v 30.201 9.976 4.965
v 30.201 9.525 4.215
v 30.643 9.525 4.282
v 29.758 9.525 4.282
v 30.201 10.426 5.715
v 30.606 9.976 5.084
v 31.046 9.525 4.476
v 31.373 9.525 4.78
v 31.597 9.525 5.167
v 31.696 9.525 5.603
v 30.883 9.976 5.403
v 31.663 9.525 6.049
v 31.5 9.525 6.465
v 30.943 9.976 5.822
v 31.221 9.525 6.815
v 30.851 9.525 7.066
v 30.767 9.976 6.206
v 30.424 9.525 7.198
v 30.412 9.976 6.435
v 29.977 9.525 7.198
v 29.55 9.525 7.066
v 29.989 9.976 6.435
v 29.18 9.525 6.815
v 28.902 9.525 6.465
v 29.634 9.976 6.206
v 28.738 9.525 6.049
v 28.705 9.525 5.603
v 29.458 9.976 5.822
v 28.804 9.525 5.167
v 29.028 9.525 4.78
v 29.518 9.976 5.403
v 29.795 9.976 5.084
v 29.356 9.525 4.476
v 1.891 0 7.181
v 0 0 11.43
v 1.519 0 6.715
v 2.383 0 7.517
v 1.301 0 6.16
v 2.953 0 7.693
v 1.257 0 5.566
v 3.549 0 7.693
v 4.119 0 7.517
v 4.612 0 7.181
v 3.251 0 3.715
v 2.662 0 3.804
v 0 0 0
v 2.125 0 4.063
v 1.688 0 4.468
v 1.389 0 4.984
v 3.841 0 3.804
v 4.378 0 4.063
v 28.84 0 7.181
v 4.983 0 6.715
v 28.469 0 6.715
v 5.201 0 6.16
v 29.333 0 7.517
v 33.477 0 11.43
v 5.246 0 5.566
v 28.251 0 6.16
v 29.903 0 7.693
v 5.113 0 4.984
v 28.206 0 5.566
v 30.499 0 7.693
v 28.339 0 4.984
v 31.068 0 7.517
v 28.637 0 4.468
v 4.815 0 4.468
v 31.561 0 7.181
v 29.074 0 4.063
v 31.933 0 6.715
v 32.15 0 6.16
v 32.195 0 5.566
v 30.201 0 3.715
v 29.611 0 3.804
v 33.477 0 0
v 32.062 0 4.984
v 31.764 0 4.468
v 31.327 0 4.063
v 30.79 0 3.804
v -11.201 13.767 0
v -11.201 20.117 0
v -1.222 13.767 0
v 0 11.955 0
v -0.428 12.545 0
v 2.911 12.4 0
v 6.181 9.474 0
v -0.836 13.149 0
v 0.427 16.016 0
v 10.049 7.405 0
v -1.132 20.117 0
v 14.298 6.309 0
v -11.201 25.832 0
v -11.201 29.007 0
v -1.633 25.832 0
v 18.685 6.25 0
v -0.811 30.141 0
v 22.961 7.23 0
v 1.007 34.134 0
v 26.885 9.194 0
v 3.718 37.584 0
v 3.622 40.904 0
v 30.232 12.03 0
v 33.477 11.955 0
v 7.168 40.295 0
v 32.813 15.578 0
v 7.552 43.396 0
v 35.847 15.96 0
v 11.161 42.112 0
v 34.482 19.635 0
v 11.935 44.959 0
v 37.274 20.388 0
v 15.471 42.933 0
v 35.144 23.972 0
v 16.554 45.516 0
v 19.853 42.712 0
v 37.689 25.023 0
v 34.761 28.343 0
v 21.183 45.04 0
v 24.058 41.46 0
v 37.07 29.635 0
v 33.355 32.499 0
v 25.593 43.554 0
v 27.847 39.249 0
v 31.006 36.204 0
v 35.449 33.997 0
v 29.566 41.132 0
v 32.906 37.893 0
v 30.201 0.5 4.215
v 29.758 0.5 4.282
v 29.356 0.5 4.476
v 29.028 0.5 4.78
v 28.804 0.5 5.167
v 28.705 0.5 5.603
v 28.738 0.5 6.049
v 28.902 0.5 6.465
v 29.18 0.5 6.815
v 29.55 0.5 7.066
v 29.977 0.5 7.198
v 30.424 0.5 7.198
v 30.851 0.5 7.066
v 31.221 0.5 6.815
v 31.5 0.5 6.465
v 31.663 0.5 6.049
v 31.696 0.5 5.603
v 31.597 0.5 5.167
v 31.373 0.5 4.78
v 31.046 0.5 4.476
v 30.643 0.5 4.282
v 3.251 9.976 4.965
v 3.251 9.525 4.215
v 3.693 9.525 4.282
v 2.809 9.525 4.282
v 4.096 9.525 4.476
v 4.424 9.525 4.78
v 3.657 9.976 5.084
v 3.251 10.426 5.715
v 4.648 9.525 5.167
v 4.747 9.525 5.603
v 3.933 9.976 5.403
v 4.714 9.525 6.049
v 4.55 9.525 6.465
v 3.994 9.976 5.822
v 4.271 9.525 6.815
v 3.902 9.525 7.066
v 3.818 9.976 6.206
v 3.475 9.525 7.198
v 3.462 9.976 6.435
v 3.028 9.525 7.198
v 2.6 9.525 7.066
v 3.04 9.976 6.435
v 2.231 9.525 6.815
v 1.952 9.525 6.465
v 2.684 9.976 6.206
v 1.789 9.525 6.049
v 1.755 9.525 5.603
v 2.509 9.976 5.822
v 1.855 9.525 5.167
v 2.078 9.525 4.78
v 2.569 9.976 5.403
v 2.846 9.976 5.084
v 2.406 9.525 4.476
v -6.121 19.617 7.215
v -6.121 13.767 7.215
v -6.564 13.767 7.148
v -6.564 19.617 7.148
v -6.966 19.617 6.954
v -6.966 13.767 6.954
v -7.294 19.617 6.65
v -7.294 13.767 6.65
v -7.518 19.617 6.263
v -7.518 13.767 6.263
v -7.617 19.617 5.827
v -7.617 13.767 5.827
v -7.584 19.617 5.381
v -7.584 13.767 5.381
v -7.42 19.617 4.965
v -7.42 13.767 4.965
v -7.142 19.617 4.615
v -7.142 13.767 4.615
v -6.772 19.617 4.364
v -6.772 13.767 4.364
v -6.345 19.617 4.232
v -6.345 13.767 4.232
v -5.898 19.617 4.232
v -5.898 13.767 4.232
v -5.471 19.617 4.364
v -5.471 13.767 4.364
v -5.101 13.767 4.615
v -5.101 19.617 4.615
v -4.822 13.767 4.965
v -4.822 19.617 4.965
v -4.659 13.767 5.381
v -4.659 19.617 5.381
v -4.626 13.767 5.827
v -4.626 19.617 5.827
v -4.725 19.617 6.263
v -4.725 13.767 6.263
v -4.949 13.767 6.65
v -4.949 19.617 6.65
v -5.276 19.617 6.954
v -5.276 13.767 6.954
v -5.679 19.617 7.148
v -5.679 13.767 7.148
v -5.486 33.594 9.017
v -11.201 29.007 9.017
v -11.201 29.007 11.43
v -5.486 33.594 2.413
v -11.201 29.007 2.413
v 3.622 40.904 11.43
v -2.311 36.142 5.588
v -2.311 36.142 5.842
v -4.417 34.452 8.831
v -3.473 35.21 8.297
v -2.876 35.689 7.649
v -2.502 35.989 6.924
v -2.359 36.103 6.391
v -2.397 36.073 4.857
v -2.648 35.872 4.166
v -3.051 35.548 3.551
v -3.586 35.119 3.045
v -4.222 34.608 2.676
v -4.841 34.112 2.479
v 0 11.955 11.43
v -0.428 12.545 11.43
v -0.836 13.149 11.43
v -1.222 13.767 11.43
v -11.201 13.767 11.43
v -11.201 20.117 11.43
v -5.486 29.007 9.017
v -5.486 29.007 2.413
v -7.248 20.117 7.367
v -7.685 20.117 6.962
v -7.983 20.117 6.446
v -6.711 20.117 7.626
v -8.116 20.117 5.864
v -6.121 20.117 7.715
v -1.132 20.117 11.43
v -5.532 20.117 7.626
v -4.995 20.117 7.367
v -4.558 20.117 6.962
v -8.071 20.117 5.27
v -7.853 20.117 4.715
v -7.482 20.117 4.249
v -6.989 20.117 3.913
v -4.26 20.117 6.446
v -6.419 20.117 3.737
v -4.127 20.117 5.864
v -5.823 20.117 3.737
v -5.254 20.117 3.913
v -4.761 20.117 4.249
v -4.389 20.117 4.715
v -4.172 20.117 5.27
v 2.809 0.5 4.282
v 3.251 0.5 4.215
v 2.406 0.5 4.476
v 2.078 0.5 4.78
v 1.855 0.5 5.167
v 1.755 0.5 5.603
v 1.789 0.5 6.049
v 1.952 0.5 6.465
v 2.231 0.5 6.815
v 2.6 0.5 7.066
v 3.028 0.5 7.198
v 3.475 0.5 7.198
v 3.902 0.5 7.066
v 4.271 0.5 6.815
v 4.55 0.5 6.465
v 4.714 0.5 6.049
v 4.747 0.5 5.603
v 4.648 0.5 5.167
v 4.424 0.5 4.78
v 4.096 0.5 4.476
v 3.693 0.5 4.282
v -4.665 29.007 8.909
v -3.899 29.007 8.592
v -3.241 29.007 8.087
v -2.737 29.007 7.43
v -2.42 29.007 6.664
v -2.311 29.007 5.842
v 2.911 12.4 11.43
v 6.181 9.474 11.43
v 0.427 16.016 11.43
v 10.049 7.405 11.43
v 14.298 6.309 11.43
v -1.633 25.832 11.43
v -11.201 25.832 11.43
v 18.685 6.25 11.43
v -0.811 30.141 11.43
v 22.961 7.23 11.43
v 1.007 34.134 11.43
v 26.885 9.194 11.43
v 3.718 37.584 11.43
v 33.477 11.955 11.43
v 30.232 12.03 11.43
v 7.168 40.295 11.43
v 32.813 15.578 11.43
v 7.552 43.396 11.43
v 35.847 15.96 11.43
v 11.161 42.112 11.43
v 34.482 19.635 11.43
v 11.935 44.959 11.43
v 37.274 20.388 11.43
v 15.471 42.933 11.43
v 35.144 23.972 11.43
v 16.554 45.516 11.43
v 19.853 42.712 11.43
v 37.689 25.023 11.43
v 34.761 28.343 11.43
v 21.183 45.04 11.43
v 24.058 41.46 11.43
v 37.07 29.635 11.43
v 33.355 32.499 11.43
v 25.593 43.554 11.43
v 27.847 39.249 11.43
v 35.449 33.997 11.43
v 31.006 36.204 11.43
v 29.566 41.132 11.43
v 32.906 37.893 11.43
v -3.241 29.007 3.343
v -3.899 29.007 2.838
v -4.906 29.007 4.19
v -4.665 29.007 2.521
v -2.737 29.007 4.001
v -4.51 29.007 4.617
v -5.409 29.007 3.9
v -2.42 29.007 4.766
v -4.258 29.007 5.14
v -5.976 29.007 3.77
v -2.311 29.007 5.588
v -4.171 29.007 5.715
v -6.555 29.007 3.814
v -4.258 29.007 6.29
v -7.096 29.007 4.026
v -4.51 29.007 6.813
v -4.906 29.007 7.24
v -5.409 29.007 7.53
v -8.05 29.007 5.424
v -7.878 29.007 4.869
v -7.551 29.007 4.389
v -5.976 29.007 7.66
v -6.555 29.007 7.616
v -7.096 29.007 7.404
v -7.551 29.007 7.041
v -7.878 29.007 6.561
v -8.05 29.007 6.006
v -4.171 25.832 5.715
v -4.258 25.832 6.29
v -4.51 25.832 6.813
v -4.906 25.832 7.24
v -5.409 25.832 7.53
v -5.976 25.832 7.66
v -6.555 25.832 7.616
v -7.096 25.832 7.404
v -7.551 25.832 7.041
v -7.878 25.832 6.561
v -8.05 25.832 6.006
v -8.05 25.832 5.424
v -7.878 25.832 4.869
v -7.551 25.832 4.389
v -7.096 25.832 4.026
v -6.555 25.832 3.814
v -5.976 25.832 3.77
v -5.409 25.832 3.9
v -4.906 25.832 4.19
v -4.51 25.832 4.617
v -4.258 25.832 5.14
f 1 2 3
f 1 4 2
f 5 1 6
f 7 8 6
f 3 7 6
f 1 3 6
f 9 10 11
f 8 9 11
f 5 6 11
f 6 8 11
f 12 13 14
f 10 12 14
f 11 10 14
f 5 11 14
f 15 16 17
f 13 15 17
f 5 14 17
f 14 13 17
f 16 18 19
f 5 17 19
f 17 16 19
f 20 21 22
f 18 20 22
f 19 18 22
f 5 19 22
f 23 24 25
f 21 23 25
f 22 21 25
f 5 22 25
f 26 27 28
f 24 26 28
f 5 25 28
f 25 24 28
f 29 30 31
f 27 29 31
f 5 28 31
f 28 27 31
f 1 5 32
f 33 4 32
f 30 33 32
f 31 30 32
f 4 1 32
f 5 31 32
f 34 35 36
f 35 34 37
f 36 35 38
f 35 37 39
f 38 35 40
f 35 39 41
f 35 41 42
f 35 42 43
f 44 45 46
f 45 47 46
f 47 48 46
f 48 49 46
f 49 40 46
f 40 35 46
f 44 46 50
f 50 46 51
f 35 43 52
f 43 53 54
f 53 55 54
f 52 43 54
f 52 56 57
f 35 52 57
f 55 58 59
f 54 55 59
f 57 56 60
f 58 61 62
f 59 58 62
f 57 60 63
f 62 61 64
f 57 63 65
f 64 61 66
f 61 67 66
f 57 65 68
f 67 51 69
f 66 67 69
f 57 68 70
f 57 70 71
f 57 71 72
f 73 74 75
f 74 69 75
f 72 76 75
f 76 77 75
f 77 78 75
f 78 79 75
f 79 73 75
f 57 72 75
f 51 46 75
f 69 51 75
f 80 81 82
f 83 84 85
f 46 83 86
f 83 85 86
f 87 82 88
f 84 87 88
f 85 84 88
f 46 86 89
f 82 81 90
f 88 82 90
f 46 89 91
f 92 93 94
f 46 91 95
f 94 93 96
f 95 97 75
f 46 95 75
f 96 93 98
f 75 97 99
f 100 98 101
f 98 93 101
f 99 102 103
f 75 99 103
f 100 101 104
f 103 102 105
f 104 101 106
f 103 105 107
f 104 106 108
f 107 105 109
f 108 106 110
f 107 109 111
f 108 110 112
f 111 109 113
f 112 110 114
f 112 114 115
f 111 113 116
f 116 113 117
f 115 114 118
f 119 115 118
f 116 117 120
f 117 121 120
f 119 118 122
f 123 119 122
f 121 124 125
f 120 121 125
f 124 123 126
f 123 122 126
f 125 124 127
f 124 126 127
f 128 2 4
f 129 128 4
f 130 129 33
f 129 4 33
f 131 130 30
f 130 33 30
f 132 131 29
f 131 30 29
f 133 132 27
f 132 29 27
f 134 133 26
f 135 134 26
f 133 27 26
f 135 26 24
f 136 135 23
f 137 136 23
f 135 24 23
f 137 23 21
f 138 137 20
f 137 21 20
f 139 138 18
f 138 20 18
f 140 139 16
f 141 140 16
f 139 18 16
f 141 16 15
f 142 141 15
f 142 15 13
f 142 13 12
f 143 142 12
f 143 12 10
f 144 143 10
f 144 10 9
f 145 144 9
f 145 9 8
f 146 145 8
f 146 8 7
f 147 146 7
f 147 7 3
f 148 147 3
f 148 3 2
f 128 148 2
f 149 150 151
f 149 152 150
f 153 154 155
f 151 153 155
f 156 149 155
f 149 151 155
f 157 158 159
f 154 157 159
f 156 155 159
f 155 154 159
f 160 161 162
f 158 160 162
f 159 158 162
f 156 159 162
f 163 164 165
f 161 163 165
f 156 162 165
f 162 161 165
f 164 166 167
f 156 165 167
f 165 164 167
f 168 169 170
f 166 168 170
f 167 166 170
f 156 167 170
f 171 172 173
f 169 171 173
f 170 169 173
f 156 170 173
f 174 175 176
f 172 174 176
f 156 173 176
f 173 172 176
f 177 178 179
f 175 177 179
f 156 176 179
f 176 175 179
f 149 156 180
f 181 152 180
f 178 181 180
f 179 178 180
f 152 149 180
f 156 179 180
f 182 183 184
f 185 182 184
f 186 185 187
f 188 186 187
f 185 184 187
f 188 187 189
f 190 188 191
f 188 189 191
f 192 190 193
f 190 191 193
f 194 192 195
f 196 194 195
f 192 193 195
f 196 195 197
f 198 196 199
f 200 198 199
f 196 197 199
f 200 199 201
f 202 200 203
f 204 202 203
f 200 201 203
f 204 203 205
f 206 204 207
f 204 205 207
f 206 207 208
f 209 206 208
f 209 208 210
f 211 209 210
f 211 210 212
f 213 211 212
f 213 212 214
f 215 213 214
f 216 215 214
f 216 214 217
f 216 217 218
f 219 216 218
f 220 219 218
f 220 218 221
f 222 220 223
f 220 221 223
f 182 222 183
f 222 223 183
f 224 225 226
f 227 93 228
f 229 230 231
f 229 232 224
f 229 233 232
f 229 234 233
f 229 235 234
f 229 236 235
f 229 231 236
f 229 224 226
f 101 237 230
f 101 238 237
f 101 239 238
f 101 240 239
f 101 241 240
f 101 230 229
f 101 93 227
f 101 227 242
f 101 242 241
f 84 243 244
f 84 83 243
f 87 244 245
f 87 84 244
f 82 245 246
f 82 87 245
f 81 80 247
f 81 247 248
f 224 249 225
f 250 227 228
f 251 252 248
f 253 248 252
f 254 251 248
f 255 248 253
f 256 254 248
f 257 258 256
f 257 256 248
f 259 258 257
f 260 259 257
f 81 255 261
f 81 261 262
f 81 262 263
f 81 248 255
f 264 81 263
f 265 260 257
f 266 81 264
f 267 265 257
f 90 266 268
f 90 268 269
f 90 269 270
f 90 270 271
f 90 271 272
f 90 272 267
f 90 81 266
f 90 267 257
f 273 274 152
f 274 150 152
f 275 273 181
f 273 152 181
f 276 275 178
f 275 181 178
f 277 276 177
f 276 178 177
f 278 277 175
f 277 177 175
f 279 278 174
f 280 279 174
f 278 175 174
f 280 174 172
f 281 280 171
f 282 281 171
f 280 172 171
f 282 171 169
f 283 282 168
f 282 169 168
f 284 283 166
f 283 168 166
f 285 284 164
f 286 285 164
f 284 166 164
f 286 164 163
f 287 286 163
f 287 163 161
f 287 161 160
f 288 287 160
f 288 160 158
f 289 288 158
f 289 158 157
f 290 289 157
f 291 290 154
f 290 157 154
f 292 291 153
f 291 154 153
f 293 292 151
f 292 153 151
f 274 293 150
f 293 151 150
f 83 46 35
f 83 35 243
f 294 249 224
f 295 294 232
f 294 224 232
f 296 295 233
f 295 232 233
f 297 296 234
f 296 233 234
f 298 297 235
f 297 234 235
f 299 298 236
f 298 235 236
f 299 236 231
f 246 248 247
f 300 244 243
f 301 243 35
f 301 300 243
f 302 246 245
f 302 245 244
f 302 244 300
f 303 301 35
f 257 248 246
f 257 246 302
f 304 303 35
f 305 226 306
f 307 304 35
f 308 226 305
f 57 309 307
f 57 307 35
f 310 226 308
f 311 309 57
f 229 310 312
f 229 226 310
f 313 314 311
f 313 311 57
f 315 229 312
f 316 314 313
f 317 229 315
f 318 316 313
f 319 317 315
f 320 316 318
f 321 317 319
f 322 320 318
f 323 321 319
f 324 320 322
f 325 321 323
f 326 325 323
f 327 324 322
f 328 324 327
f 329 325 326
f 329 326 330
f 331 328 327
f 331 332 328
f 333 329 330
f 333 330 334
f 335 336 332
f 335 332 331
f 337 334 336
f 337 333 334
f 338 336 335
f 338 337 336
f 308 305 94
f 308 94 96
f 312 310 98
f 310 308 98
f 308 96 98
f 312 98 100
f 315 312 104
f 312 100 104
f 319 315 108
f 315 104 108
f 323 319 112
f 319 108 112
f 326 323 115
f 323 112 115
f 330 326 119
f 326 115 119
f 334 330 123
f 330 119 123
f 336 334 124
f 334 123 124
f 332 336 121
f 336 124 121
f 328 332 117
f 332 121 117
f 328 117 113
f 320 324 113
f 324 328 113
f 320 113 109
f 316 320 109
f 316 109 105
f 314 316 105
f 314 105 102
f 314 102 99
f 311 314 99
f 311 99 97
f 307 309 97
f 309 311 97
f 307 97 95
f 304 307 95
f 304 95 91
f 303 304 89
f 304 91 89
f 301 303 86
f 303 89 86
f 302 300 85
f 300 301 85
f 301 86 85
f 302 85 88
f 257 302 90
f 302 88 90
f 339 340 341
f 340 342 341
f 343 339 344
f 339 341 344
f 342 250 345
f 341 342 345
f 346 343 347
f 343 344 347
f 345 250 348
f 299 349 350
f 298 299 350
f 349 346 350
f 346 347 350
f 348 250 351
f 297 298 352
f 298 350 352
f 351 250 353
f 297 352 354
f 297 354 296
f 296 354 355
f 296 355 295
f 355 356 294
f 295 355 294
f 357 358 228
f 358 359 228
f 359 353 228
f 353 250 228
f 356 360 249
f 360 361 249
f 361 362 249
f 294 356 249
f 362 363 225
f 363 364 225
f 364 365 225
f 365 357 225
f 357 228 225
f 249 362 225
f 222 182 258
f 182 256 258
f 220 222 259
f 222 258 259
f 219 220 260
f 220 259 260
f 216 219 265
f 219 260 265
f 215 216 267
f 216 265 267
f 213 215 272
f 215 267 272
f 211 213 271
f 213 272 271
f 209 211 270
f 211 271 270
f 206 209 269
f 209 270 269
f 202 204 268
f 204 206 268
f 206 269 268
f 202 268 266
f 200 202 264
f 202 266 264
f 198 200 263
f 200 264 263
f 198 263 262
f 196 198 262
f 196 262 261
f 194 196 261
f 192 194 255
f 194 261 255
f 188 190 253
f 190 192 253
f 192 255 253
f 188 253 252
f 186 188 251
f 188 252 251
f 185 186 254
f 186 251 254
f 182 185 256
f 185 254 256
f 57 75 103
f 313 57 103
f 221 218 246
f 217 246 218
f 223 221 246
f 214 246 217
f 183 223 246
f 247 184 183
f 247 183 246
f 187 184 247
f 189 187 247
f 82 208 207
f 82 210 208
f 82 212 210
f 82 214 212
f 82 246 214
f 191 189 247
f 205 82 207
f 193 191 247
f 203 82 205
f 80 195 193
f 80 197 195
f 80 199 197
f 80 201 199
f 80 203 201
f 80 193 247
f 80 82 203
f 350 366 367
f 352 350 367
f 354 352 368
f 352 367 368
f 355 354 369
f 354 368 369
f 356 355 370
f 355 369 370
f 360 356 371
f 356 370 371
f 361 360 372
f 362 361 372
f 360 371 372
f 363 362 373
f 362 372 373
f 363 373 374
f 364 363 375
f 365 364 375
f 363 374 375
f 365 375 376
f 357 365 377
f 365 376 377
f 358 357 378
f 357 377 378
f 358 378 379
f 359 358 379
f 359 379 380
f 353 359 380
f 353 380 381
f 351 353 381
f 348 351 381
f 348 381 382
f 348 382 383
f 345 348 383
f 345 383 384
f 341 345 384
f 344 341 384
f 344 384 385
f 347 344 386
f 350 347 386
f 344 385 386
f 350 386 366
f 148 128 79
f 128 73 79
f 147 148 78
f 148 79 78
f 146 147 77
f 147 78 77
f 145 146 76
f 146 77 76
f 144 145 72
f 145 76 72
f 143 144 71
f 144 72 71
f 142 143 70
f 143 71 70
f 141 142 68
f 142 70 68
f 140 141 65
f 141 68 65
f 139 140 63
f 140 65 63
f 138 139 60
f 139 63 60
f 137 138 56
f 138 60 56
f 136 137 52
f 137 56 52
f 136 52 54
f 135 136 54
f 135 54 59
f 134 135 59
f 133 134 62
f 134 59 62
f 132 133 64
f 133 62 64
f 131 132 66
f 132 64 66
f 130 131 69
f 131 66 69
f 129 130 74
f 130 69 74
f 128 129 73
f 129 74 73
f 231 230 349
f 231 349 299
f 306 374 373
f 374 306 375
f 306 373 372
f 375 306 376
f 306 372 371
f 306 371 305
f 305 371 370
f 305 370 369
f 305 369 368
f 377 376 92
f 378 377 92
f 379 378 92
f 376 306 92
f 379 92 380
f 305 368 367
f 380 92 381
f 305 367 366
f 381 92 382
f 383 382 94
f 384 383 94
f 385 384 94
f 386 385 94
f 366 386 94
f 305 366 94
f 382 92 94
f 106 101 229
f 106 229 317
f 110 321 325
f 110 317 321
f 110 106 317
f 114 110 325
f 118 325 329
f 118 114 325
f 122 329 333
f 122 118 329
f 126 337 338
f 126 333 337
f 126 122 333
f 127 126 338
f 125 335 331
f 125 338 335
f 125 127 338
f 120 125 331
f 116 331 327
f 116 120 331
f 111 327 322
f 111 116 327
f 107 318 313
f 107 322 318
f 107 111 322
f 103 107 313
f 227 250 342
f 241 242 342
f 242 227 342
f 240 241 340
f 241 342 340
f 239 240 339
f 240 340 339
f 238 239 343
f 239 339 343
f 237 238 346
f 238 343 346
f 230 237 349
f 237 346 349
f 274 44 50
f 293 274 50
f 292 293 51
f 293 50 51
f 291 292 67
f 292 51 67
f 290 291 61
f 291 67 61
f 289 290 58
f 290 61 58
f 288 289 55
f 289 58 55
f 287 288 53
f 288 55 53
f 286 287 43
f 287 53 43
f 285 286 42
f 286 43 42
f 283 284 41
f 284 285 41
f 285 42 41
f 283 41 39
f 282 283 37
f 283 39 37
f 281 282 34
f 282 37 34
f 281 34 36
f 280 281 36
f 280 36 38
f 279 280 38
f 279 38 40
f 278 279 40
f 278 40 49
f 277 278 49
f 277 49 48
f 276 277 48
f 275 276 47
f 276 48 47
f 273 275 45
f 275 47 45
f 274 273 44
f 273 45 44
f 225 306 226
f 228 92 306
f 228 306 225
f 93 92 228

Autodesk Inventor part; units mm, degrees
ref_plane "YZ Plane" through (0, 0, 0) normal (1, 0, 0) x (0, 1, 0)
ref_plane "XZ Plane" through (0, 0, 0) normal (0, 1, 0) x (-1, 0, 0)
ref_plane "XY Plane" through (0, 0, 0) normal (0, 0, 1) x (1, 0, 0)
sketch "Sketch1" plane through (0, 0, 0) normal (0, 0, 1) x (1, 0, 0)
  arc A0 (-1.1319, 20.1168) -> (-1.6326, 25.8318) centre (16.7386, 24.5618) ccw
  line L0 (0, 0) -> (33.4772, 0)
  line L1 (33.4772, 0) -> (33.4772, 11.955)
  line L2 (0, 0) -> (0, 11.955)
  line L3 (-1.2219, 13.7668) -> (-11.2014, 13.7668)
  line L4 (-11.2014, 13.7668) -> (-11.2014, 20.1168)
  line L5 (-11.2014, 20.1168) -> (-1.1319, 20.1168)
  line L6 (-11.2014, 25.8318) -> (-1.6326, 25.8318)
  line L7 (-11.2014, 25.8318) -> (-11.2014, 29.0068)
  line L8 (-11.2014, 29.0068) -> (3.6223, 40.9042)
  arc A1 (-1.2219, 13.7668) -> (0, 11.955) centre (16.7386, 24.5618) ccw
  arc A2 (33.4772, 11.955) -> (3.6223, 40.9042) centre (16.7386, 24.5618) ccw
  dimension "d0" = 24.5618
  dimension "d1" = 16.7386
  dimension "d2" = 36.83
  dimension "d4" = 33.4772
  dimension "d5" = 11.955
  dimension "d6" = 6.35
  dimension "d7" = 13.7668
  dimension "d8" = 5.715
  dimension "d9" = 27.94
  dimension "d10" = 3.175
  dimension "d13" = 20.955
extrude "Clamp Body" add sketch "Sketch1" along normal blind 11.43
sketch "Sketch2" plane through (0, 0, 0) normal (0, -1, 0) x (1, 0, 0)
  circle A0 centre (3.2512, 5.715) radius 1.5
  circle A1 centre (30.2006, 5.715) radius 1.5
  line L0 (-11.2014, 0) -> (-1.2219, 0) projected
  line L1 (0, 0) -> (0, 11.43) projected
  line L2 (33.4772, 0) -> (33.4772, 11.43) projected
  dimension "d16" = 3
  dimension "d17" = 5.715
  dimension "d18" = 26.9494
  dimension "d20" = 3.2512
  dimension "d21" = 3.2766
hole "Mounting Holes" at (30.2006, 0, 5.715) at (3.2512, 0, 5.715) direction (0, 1, 0) diameter 3 depth 9.525 tip angle 118 countersink diameter 4 countersink angle 90
sketch "Sketch7" plane through (-11.2014, 20.1168, 0) normal (0, 1, 0) x (1, 0, 0)
  circle A0 centre (5.08, -5.715) radius 1.5
  line L0 (0, 0) -> (0, -11.43) projected
  line L1 (10.0695, 0) -> (0, 0) projected
  point P0 (11.2014, 0)
  dimension "d41" = 3
  dimension "d42" = 5.08
  dimension "d43" = 5.715
hole "Tightner Threaded Hole" at (-6.1214, 20.1168, 5.715) direction (0, -1, 0) diameter 3 end through all countersink diameter 4 countersink angle 90
sketch "Sketch4" plane through (-11.2014, 25.8318, 0) normal (0, -1, 0) x (1, 0, 0)
  circle A0 centre (5.08, 5.715) radius 1.95
  circle A1 centre (5.08, 5.715) radius 1.5 projected
  point P0 (11.2014, 0)
  dimension "d31" = 3.9
extrude "Tightner Hole" cut sketch "Sketch4" against normal blind 9.525 contours A0 | A1
sketch "Sketch6" plane through (-11.2014, 25.8318, 0) normal (-1, 0, 0) x (0, 0, 1)
  line L0 (2.413, 3.175) -> (9.017, 3.175)
  line L1 (9.017, 3.175) -> (9.017, 15.875)
  line L2 (9.017, 15.875) -> (2.413, 15.875)
  line L3 (2.413, 15.875) -> (2.413, 3.175)
  line L4 (0, 3.175) -> (0, 0) projected
  line L5 (11.43, 3.175) -> (11.43, 0) projected
  line L6 (0, 3.175) -> (11.43, 3.175) projected
  point P0 (0, -25.8318)
  dimension "d34" = 2.413
  dimension "d35" = 2.413
  dimension "d36" = 12.7
  dimension "d39" = 6.604
extrude "Tightner Cutout" cut sketch "Sketch6" against normal blind 8.89
fillet "Tightner Fillet" radius 3.175 2 edges at (-2.3114, 32.5743, 2.413) (-2.3114, 32.5743, 9.017)
properties part number "MotorClampXT"
